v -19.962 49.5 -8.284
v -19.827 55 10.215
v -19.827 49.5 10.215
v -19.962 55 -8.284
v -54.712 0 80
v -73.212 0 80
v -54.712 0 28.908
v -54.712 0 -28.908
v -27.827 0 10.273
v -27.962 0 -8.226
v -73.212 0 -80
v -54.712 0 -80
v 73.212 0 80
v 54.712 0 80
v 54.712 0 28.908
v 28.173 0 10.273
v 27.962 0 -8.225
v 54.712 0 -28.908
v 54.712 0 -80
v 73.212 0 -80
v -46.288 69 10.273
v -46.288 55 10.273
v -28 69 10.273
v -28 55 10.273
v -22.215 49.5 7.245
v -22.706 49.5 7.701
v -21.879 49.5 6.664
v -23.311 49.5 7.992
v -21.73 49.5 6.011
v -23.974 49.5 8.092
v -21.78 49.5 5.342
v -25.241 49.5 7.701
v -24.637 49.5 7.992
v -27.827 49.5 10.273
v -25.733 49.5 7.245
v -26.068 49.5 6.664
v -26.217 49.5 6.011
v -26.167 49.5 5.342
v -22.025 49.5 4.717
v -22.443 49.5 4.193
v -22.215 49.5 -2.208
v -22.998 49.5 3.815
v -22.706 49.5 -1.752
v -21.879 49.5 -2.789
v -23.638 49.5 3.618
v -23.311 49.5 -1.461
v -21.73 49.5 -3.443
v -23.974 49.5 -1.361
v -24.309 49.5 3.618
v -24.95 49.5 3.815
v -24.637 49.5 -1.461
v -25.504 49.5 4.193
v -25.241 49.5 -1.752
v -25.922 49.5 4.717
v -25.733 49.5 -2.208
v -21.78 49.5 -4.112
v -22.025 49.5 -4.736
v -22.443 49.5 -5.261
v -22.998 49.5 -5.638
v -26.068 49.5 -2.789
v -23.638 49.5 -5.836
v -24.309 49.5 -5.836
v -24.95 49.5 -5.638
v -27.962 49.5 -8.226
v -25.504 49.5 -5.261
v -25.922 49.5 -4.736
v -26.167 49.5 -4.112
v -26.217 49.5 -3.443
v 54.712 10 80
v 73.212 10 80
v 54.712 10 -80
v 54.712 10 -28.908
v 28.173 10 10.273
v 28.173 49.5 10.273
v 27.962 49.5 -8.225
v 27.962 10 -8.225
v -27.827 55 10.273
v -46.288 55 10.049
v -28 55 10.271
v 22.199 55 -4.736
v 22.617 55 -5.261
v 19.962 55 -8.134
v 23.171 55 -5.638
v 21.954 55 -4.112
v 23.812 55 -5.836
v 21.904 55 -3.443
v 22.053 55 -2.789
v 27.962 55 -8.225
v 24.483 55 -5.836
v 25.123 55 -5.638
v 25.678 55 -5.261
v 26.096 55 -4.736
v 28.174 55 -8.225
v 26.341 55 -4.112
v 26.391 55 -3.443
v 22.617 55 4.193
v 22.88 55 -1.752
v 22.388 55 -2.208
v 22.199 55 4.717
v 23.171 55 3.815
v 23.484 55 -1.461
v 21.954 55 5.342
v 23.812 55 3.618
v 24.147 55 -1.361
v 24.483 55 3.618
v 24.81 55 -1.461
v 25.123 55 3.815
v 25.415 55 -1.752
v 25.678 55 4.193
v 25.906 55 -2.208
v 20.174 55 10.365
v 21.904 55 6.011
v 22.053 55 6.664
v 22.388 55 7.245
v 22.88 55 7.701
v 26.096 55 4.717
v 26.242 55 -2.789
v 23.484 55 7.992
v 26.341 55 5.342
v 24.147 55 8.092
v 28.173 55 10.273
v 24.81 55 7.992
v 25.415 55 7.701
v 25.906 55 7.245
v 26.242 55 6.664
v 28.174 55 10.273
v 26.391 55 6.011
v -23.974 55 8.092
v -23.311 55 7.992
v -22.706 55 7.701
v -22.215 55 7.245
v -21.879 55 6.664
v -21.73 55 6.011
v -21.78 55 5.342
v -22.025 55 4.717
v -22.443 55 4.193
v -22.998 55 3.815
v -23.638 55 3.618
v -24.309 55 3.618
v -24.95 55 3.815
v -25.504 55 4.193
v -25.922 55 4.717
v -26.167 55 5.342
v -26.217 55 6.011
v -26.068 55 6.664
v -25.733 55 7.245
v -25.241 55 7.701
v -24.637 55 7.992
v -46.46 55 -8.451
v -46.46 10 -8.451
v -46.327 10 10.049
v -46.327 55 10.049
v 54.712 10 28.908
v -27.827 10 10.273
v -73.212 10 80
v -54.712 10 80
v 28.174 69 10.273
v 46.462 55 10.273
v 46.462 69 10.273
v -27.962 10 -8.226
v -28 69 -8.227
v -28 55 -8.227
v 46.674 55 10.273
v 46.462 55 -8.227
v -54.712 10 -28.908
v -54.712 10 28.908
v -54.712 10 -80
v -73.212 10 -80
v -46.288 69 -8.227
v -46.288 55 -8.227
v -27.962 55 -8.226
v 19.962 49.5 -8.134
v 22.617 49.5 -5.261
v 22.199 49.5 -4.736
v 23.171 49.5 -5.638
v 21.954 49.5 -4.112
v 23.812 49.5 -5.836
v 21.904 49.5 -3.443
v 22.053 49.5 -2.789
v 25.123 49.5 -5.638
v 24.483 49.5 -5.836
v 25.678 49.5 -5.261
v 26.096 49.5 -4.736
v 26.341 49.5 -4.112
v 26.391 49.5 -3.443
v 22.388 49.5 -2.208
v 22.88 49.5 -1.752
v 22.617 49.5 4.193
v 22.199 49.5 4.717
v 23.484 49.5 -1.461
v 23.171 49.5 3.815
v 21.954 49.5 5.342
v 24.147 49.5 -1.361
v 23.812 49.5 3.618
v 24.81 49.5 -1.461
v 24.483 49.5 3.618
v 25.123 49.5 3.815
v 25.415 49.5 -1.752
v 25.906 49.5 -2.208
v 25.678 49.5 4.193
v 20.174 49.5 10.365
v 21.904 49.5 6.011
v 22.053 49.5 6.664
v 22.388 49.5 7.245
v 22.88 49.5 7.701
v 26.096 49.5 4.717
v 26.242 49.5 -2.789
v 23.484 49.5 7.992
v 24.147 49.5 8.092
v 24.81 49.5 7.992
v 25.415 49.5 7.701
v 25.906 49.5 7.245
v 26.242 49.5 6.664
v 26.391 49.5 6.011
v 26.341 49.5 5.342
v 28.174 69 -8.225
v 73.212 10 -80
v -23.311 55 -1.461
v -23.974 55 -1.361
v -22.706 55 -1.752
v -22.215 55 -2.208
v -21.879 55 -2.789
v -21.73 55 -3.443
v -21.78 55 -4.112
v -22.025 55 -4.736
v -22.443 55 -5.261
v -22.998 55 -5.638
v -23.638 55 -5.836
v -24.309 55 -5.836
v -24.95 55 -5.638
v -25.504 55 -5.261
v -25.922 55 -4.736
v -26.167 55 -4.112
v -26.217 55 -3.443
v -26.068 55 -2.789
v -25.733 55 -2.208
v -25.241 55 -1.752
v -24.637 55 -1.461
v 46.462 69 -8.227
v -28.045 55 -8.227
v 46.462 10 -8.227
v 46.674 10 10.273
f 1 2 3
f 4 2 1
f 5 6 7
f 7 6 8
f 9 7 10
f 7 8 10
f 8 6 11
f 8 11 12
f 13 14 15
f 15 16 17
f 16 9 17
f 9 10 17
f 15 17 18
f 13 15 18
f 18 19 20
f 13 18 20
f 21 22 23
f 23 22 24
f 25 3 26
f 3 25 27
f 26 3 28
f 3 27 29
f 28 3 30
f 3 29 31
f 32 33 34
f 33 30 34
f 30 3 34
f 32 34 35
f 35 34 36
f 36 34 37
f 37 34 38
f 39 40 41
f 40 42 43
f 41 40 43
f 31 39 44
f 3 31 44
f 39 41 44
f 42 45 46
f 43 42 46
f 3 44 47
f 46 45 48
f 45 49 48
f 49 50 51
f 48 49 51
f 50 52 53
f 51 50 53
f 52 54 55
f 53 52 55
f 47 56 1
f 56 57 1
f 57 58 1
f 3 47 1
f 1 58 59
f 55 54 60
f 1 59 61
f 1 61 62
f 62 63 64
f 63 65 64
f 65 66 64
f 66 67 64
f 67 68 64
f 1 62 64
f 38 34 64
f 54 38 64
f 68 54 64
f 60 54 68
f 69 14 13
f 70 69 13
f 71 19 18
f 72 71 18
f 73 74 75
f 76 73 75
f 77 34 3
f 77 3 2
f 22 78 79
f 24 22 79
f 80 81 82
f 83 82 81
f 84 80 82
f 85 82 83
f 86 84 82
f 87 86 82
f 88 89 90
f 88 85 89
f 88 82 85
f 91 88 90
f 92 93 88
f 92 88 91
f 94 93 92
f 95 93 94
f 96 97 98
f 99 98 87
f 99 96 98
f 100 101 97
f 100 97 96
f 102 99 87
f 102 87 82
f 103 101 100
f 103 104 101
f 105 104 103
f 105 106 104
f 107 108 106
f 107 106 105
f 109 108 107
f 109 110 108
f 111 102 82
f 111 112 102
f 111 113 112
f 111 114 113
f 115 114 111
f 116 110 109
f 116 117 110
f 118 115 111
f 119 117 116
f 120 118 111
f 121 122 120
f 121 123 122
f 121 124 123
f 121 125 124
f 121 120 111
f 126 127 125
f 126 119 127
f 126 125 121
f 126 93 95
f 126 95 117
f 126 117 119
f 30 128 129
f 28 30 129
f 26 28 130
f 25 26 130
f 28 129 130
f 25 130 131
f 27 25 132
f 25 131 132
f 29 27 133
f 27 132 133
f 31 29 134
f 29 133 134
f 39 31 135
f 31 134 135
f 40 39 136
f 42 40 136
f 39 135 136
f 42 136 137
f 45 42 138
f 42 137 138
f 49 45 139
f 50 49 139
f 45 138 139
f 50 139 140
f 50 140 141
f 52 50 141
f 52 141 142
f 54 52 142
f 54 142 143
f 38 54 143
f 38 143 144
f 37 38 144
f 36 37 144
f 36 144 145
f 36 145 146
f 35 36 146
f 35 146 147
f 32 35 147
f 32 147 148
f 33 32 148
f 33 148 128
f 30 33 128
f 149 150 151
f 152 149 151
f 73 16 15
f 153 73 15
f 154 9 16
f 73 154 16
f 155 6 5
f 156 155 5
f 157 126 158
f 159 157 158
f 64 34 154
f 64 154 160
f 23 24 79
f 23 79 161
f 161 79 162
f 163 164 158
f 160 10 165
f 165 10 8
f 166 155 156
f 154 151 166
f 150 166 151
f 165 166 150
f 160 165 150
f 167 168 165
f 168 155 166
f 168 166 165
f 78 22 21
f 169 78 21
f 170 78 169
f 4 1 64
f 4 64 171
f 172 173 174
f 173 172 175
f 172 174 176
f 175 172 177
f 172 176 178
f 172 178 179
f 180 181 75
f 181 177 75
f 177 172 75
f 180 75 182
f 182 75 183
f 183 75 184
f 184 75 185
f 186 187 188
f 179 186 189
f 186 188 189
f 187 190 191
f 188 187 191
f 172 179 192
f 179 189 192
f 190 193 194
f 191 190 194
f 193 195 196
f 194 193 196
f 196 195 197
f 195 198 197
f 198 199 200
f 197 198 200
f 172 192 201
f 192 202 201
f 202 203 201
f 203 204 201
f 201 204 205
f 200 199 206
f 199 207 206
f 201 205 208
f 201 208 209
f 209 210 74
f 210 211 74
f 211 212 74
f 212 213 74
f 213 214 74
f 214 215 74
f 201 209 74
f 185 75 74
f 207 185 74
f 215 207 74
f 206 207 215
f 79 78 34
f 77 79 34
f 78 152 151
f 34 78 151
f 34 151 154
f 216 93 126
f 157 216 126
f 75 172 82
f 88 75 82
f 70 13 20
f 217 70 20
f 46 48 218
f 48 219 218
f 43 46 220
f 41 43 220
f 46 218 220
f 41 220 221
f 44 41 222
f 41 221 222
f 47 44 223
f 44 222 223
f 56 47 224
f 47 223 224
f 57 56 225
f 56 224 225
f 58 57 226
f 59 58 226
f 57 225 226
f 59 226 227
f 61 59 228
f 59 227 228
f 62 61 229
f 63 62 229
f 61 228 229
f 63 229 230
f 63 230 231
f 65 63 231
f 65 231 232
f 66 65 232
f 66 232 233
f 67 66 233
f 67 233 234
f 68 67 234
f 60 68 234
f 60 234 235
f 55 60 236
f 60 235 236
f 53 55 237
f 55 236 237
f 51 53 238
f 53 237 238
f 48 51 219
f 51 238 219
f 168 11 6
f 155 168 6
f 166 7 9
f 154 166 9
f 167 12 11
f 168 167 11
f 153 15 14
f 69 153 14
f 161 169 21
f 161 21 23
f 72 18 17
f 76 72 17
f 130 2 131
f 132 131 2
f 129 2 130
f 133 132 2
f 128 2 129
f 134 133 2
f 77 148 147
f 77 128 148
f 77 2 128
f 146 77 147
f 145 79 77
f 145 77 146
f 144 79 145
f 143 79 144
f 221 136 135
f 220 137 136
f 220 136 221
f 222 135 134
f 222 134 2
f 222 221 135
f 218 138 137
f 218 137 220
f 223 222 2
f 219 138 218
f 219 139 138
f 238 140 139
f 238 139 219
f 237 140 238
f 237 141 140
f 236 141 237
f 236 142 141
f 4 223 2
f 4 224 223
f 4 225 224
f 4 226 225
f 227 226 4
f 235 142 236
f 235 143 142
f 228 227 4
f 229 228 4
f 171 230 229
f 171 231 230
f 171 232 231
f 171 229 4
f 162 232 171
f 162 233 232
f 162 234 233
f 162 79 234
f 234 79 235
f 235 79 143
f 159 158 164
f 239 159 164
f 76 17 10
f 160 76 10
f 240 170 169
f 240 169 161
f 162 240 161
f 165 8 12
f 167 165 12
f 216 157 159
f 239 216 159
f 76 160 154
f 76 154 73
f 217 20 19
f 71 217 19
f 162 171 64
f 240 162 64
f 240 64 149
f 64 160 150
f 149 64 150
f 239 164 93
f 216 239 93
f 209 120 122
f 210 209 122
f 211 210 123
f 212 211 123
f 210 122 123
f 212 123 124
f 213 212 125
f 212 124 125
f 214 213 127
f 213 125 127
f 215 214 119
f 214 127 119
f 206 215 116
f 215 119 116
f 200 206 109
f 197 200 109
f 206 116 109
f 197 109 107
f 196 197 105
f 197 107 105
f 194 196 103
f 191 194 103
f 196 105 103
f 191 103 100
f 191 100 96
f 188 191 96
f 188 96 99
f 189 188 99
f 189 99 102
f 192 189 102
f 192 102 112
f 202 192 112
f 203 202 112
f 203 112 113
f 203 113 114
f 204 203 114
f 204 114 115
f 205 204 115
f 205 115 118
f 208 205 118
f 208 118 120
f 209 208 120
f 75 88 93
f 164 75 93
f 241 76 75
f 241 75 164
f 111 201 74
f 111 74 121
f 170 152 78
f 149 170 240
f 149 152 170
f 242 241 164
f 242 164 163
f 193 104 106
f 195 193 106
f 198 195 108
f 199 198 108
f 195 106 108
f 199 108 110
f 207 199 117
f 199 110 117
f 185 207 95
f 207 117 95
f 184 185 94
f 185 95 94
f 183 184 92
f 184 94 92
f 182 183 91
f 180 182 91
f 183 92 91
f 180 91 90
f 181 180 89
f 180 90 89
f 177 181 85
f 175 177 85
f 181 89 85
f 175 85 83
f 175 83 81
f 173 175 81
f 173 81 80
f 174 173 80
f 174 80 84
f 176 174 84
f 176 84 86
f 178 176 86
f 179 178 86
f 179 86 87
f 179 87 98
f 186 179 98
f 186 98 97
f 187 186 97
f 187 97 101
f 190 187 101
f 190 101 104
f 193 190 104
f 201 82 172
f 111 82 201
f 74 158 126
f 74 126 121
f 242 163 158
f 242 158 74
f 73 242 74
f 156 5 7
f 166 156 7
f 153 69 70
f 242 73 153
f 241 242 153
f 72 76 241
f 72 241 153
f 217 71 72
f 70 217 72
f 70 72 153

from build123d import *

# Parameters (mm, degrees)
BOSS_EXTRUDE1_DEPTH     = 10
BOSS_EXTRUDE1_2_DEPTH   = 10
BOSS_EXTRUDE1_3_DEPTH   = 10
BOSS_EXTRUDE5_DEPTH     = 55
SKETCH5_W               = 18.5
SKETCH5_H               = 5.5
BOSS_EXTRUDE6_DEPTH     = 8
SKETCH6_W               = 18.5
SKETCH6_H               = 5.5
BOSS_EXTRUDE7_DEPTH     = 8
BOSS_EXTRUDE8_OUTLINE_W = 18.287900599
BOSS_EXTRUDE8_OUTLINE_H = 18.500510452
BOSS_EXTRUDE8_DEPTH     = 14
SKETCH7_3_R             = 2.25
CUT_EXTRUDE1_DEPTH      = 10


# Read off the part's stored shape, not the designer's step: Boss-Extrude8
with BuildPart() as part:
    # Sketch1 → Boss-Extrude1 (new body)
    with BuildSketch(Plane(origin=(0, 0, 0), x_dir=(1, 0, 0), z_dir=(0, 1, 0))):
        Polygon((-54.711603102, -80), (-54.711603102, -28.907893648), (-27.826820773, -10.273471277), (-46.326820773, -10.048678982), (-46.460237213, 8.450839932), (-27.961603102, 8.226037736), (-54.711603102, 28.907893648), (-54.711603102, 80), (-73.211603102, 80), (-73.211603102, -80), align=None)
    extrude(amount=BOSS_EXTRUDE1_DEPTH)



with BuildPart() as body_2:
    # Sketch1 → Boss-Extrude1 2 (new body)
    with BuildSketch(Plane(origin=(0, 0, 0), x_dir=(1, 0, 0), z_dir=(0, 1, 0))):
        Polygon((-27.961603102, 8.226037736), (-27.826820773, -10.273471277), (28.173179227, -10.273471277), (27.961603102, 8.225318833), align=None)
    extrude(amount=BOSS_EXTRUDE1_2_DEPTH)


with BuildPart() as body_3:
    # Sketch1 → Boss-Extrude1 3 (new body)
    with BuildSketch(Plane(origin=(0, 0, 0), x_dir=(1, 0, 0), z_dir=(0, 1, 0))):
        Polygon((46.674397065, -10.272954842), (28.173179227, -10.273471277), (54.711603102, -28.907893648), (54.711603102, -80), (73.211603102, -80), (73.211603102, 80), (54.711603102, 80), (54.711603102, 28.907893648), (27.961603102, 8.225318833), (46.461603021, 8.227045158), align=None)
    extrude(amount=BOSS_EXTRUDE1_3_DEPTH)


with BuildPart() as part_1:
    add(part.part)

    add(body_2.part)  # Boss-Extrude5 merges body 2

    add(body_3.part)  # Boss-Extrude5 merges body 3
    # Sketch1<9> → Boss-Extrude5 (add)
    with BuildSketch(Plane(origin=(0, 0, 0), x_dir=(1, 0, 0), z_dir=(0, 1, 0))):
        Polygon((46.461603021, 8.227045158), (46.674397065, -10.272954842), (28.173179227, -10.273471277), (27.961603102, 8.225318833), align=None)
        Polygon((-27.961603102, 8.226037736), (-46.460237213, 8.450839932), (-46.326820773, -10.048678982), (-27.826820773, -10.273471277), align=None)
    extrude(amount=BOSS_EXTRUDE5_DEPTH)

    # Sketch5 → Boss-Extrude6 (add)
    with BuildSketch(Plane(origin=(28.052008971, 0, -0.32083911), x_dir=(0.011436547294728296, 0, 0.999934600554444), z_dir=(-0.999934600554444, 0, 0.011436547294728296))):
        with Locations((1.345003295, 52.25)):
            Rectangle(SKETCH5_W, SKETCH5_H)
    extrude(amount=BOSS_EXTRUDE6_DEPTH)

    # Sketch6 → Boss-Extrude7 (add)
    with BuildSketch(Plane(origin=(-27.900189464, 0, 0.203273098), x_dir=(-0.007285531290396893, 0, -0.9999734601647269), z_dir=(0.9999734601647269, 0, -0.007285531290396893))):
        with Locations((-0.820465448, 52.25)):
            Rectangle(SKETCH6_W, SKETCH6_H)
    extrude(amount=BOSS_EXTRUDE7_DEPTH)

    # Boss-Extrude8 outline → Boss-Extrude8 (add)
    with BuildSketch(Plane(origin=(0, 55, 0), x_dir=(1, 0, 0), z_dir=(0, 1, 0))):
        with Locations((-37.144162619, -1.023210068)):
            Rectangle(BOSS_EXTRUDE8_OUTLINE_W, BOSS_EXTRUDE8_OUTLINE_H)
        Polygon((46.461603021, -10.272960782), (46.461603021, 8.227045158), (28.173702422, 8.225338625), (28.173702422, -10.273471263), align=None)
    extrude(amount=BOSS_EXTRUDE8_DEPTH)

    # Sketch7<3> → Cut-Extrude1 (cut, symmetric)
    with BuildSketch(Plane(origin=(0, 55, 0), x_dir=(1, 0, 0), z_dir=(0, 1, 0))):
        with Locations(Location((24.147255407, 3.611254336, 0), (0, 0, 270))):
            Circle(SKETCH7_3_R)
        with Locations(Location((24.147255407, -5.842391538, 0), (0, 0, 270))):
            Circle(SKETCH7_3_R)
        with Locations(Location((-23.973765303, -5.842391538, 0), (0, 0, 270))):
            Circle(SKETCH7_3_R)
        with Locations(Location((-23.973765303, 3.611254336, 0), (0, 0, 270))):
            Circle(SKETCH7_3_R)
    extrude(amount=CUT_EXTRUDE1_DEPTH, both=True, mode=Mode.SUBTRACT)


solid = part_1.part
